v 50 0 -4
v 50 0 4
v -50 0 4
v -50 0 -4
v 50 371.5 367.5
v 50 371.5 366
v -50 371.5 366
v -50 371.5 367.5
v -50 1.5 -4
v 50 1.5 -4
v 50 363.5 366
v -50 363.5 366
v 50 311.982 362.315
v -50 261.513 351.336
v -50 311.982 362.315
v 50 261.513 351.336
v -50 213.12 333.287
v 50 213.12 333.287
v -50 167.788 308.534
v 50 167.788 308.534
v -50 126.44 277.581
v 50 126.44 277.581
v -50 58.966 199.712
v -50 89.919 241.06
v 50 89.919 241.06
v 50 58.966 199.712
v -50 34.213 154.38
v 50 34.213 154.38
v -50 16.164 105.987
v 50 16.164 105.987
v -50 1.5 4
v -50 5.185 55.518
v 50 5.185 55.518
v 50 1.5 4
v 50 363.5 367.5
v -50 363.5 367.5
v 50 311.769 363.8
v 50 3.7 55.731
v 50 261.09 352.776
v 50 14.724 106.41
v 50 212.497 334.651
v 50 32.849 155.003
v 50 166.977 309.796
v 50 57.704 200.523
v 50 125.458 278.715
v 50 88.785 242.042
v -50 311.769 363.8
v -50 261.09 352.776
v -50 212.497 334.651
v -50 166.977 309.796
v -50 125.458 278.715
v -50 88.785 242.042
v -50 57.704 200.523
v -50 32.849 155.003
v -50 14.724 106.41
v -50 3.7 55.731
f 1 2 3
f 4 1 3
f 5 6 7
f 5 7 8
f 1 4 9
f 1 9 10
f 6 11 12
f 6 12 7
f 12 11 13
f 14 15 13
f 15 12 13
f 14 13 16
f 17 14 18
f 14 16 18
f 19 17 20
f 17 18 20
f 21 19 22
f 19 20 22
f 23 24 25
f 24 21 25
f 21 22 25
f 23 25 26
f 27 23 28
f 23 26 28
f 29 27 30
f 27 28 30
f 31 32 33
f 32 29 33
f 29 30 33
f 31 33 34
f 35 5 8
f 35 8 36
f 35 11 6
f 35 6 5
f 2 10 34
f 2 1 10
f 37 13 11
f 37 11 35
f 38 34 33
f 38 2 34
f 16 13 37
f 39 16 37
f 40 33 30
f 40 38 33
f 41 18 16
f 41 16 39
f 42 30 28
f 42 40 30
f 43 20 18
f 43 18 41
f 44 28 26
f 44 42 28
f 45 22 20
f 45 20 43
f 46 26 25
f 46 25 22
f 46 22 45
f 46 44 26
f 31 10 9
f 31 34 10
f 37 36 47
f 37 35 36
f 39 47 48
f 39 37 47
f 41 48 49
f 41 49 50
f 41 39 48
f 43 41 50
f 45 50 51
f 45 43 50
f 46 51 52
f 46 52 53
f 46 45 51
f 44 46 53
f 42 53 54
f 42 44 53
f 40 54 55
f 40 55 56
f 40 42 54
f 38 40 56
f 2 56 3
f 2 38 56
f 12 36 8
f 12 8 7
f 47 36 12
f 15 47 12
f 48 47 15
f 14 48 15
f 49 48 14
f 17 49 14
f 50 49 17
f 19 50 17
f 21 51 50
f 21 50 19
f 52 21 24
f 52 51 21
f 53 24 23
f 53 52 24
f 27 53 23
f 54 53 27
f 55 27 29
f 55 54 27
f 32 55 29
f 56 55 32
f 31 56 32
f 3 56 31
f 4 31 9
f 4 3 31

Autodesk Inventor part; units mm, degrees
ref_plane "YZ Plane" through (0, 0, 0) normal (1, 0, 0) x (0, 1, 0)
ref_plane "XZ Plane" through (0, 0, 0) normal (0, 1, 0) x (-1, 0, 0)
ref_plane "XY Plane" through (0, 0, 0) normal (0, 0, 1) x (1, 0, 0)
sketch "Sketch1" plane through (0, 0, 0) normal (0, 1, 0) x (-1, 0, 0)
  line L0 (-50, 4) -> (50, 4)
  line L1 (50, 4) -> (50, -4)
  line L2 (50, -4) -> (-50, -4)
  line L3 (-50, -4) -> (-50, 4)
  line L4 (-50, 4) -> (50, -4) construction
  line L5 (50, 4) -> (-50, -4) construction
  point P0 (0, 0)
  dimension "d0" = 100
  dimension "d1" = 8
extrude "Plate1" add sketch "Sketch1" along normal blind 1.5
sketch "Sketch2" plane through (50, 363.5, 366) normal (0, 0, 1) x (1, 0, 0)
  line L0 (-100, 0) -> (0, 0)
  line L1 (0, 0) -> (0, 8)
  line L2 (0, 8) -> (-100, 8)
  line L3 (-100, 8) -> (-100, 0)
edge flange "Flange1" height 370 angle 90 thickness 1.5 bend radius 362 thickness toward (0, 0, 1) relief tear relief width 1.5 relief depth 0.75 edges at (0, 1.5, 4) wall of the first edge with corners at (-50, 363.5, 366) (50, 363.5, 366) (50, 371.5, 366) (-50, 371.5, 366)
bend "Bend1"
corner "Corner1"
equation "\"d2\" = Thickness"
equation "\"d3\" = BendReliefWidth"
equation "\"d4\" = BendReliefDepth"
equation "\"d5\" = MinimumRemnant"
equation "\"d6\" = TransitionRadius"
equation "\"d10\" = CornerReliefSize"
equation "\"d11\" = GapSize"
equation "\"d12\" = JacobiRadiusSize"
equation "\"BendRadius\" = Thickness"
equation "\"BendReliefWidth\" = Thickness"
equation "\"BendReliefDepth\" = 0.5 * Thickness"
equation "\"CornerReliefSize\" = 4 * Thickness"
equation "\"MinimumRemnant\" = 2 * Thickness"
equation "\"TransitionRadius\" = BendRadius"
equation "\"JacobiRadiusSize\" = BendRadius"
equation "\"GapSize\" = Thickness"
equation "\"Thickness\" = 1.5"
properties part number "CHAPA_8" material "Steel, Mild, Welded"
